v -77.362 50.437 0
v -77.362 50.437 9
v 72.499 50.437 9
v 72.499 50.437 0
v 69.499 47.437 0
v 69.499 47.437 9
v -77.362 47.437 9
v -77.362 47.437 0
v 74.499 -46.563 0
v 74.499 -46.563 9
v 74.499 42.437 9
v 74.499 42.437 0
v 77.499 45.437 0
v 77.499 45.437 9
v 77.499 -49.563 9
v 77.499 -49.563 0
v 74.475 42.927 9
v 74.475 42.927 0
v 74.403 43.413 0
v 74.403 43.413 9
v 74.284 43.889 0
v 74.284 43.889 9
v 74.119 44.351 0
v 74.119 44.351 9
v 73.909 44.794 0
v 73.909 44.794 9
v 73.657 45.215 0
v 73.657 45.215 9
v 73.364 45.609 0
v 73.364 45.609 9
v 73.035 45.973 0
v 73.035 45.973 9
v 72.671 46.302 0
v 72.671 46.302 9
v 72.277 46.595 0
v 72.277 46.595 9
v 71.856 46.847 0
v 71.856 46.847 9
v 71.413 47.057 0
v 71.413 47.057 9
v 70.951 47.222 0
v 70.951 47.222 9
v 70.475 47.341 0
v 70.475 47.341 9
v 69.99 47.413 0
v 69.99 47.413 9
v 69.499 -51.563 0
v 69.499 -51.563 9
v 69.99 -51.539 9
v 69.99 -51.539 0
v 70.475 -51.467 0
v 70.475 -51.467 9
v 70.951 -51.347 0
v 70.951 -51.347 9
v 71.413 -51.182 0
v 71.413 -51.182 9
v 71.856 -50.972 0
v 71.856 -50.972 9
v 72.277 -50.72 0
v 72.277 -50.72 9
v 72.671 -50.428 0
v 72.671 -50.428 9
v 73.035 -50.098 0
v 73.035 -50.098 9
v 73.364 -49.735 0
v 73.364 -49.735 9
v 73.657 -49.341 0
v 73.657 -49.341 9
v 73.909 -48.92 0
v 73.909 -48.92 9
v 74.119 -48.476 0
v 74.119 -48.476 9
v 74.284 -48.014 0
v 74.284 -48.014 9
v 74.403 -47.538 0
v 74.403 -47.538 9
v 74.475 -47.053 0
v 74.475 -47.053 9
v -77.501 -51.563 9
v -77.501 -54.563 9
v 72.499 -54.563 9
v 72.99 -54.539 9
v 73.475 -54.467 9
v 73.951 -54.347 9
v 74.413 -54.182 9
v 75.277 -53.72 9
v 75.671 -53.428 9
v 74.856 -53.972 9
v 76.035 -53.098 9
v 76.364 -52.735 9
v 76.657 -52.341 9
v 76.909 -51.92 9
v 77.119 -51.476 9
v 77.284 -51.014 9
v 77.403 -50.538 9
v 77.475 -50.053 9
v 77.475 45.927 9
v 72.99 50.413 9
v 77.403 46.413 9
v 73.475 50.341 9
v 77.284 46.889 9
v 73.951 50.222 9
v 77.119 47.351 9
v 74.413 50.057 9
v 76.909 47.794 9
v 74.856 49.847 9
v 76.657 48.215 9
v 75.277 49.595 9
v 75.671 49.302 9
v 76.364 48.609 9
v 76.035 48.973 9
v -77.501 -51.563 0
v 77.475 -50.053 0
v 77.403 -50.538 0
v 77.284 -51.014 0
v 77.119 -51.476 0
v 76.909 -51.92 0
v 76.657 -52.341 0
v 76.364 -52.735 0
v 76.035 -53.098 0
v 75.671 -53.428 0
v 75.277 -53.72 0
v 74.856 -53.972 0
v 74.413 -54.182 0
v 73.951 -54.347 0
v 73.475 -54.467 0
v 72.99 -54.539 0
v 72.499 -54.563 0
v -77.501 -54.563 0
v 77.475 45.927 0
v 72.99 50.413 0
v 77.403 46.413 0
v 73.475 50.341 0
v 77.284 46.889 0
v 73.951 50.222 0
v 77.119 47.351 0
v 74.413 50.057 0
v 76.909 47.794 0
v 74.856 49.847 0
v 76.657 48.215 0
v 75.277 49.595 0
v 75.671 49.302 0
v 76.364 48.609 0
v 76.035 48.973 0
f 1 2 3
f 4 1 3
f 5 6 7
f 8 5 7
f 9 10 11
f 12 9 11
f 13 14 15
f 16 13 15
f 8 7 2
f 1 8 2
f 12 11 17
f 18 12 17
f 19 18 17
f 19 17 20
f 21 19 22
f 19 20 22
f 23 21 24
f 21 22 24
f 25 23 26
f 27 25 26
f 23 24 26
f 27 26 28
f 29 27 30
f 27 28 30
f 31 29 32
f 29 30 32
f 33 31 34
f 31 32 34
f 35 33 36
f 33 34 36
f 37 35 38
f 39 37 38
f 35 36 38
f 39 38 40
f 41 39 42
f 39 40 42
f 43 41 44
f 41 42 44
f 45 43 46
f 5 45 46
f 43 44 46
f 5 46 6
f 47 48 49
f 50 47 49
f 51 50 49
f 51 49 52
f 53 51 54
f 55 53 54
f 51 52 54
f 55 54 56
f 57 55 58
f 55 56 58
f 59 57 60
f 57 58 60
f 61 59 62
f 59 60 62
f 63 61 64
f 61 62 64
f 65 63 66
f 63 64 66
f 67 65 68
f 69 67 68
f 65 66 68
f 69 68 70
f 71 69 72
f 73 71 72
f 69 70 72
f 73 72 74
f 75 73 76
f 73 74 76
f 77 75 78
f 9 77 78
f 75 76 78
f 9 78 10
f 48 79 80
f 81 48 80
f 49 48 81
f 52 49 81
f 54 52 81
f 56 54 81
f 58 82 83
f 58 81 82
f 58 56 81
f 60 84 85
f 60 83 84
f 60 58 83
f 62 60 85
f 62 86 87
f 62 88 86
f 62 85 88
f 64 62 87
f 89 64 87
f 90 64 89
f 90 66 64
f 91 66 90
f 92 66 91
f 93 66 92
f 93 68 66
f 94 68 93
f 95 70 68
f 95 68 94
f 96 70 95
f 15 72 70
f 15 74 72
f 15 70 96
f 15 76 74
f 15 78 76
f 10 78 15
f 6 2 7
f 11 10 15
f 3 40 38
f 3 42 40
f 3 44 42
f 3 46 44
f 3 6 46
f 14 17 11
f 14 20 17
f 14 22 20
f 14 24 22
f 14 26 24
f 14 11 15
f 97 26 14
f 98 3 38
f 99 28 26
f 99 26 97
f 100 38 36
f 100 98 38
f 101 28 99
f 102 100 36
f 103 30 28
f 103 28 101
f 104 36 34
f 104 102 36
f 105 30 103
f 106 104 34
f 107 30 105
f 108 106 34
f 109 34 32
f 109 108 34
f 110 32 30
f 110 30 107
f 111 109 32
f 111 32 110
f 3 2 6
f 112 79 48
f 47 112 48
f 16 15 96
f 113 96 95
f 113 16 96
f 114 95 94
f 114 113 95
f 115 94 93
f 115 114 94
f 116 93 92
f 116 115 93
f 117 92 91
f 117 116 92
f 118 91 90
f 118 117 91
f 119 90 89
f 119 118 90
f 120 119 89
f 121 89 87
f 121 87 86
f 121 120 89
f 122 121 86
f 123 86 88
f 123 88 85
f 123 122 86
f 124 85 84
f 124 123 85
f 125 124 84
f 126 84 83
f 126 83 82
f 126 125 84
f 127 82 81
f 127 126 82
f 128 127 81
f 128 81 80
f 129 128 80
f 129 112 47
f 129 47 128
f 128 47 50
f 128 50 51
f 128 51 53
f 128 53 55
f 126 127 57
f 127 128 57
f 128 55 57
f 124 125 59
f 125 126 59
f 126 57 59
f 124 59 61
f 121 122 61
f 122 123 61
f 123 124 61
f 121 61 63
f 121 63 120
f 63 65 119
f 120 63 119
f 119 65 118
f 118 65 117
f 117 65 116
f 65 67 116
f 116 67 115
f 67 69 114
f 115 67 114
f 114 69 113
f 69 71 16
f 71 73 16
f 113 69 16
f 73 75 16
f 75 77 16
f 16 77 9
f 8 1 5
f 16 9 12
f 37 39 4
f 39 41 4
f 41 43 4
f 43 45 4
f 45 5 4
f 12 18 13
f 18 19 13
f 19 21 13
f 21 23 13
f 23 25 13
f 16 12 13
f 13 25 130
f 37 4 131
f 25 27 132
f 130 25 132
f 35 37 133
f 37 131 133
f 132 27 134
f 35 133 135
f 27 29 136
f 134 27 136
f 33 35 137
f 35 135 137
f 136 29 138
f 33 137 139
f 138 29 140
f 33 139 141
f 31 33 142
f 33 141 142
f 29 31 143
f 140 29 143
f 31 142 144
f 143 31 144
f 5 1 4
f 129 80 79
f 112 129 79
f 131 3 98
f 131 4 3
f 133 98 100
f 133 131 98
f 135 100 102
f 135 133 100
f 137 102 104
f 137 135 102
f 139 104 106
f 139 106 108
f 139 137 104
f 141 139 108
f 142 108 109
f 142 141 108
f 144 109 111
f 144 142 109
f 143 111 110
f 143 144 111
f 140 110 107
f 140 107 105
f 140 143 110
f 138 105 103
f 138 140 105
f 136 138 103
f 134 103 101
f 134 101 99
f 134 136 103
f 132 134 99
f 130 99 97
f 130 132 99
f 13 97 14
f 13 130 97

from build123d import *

# Parameters (mm, degrees)
F0_W     = 200
F0_H     = 150
F1_DEPTH = 9
F2_W     = 10
F2_H     = 12.5
F3_DEPTH = 25
F4_R     = 5


with BuildPart() as f1:
    # F0 (on Top) → F1 (new body)
    with BuildSketch(Plane.XY):
        Rectangle(F0_W, F0_H)
    extrude(amount=F1_DEPTH)

    # F2 (on face) → F3 (cut)
    with BuildSketch(Plane.XY.offset(9)):
        Polygon((87.4994372893, -64.5627596692), (87.4994372893, 60.4372403308), (-87.5005627107, 60.4372403308), (-87.5005627107, 34.7239444211), (-41.0005627107, 34.7239444211), (-33.5005627107, 34.7239444211), (-33.5005627107, 26.7239444211), (-38.5005627107, 26.7239444211), (-38.5005627107, 29.7239444211), (-46.0005627107, 29.7239444211), (-87.5005627107, 29.7239444211), (-87.5005627107, 2.7372403308), (-92.5005627107, -0.2627596692), (-100, -0.2627596692), (-100, -3.8627596692), (-92.5005627107, -3.8627596692), (-87.5005627107, -6.8627596692), (-87.5005627107, -33.2760555789), (-38.5005627107, -33.2760555789), (-38.5005627107, -30.2760555789), (-33.5005627107, -30.2760555789), (-33.5005627107, -38.2760555789), (-41.0005627107, -38.2760555789), (-46.0005627107, -38.2760555789), (-87.5005627107, -38.2760555789), (-87.5005627107, -64.5627596692), (-77.5005627107, -64.5627596692), align=None)
        with BuildLine():
            Line((-77.3623862099, 50.4372403308), (-74.3623862099, 50.4372403308))
            Line((-74.3623862099, 50.4372403308), (60.6376137901, 50.4372403308))
            Line((60.6376137901, 50.4372403308), (74.4994372893, 50.4372403308))
            Line((74.4994372893, 50.4372403308), (77.4994372893, 50.4372403308))
            Line((77.4994372893, 50.4372403308), (77.4994372893, 47.4372403308))
            Line((77.4994372893, 47.4372403308), (77.4994372893, -54.5627596692))
            Line((77.4994372893, -54.5627596692), (60.6376137901, -54.5627596692))
            Line((60.6376137901, -54.5627596692), (-77.5005627107, -54.5627596692))
            Line((-77.5005627107, -54.5627596692), (-77.5005627107, -51.5627596692))
            Line((-77.5005627107, -51.5627596692), (60.6376137901, -51.5627596692))
            Line((60.6376137901, -51.5627596692), (69.4994372893, -51.5627596692))
            ThreePointArc((69.4994372893, -51.5627596692), (73.0349711952, -50.0982935751), (74.4994372893, -46.5627596692))
            Line((74.4994372893, -46.5627596692), (74.4994372893, 42.4372403308))
            ThreePointArc((74.4994372893, 42.4372403308), (73.0349711952, 45.9727742368), (69.4994372893, 47.4372403308))
            Line((69.4994372893, 47.4372403308), (60.6376137901, 47.4372403308))
            Line((60.6376137901, 47.4372403308), (57.6376137901, 47.4372403308))
            Line((57.6376137901, 47.4372403308), (-74.3623862099, 47.4372403308))
            Line((-74.3623862099, 47.4372403308), (-77.3623862099, 47.4372403308))
            Line((-77.3623862099, 47.4372403308), (-77.3623862099, 50.4372403308))
        make_face(mode=Mode.SUBTRACT)
        Polygon((39.9994372893, -27.0627596692), (39.9994372893, -2.0627596692), (39.9994372893, 22.9372403308), (39.9994372893, 35.4372403308), (49.9994372893, 35.4372403308), (49.9994372893, 22.9372403308), (49.9994372893, -27.0627596692), (49.9994372893, -39.5627596692), (39.9994372893, -39.5627596692), align=None, mode=Mode.SUBTRACT)
        Polygon((39.9994372893, 22.9372403308), (39.9994372893, -2.0627596692), (39.9994372893, -27.0627596692), (49.9994372893, -27.0627596692), (49.9994372893, 22.9372403308), align=None)
        with Locations((44.9994372893, 29.1872403308)):
            Rectangle(F2_W, F2_H)
        with Locations((44.9994372893, -33.3127596692)):
            Rectangle(F2_W, F2_H)
        Polygon((-87.5005627107, 60.4372403308), (87.4994372893, 60.4372403308), (87.4994372893, -64.5627596692), (-77.5005627107, -64.5627596692), (-87.5005627107, -64.5627596692), (-87.5005627107, -38.2760555789), (-46.0005627107, -38.2760555789), (-41.0005627107, -38.2760555789), (-33.5005627107, -38.2760555789), (-33.5005627107, -30.2760555789), (-38.5005627107, -30.2760555789), (-38.5005627107, -33.2760555789), (-87.5005627107, -33.2760555789), (-87.5005627107, -6.8627596692), (-92.5005627107, -3.8627596692), (-100, -3.8627596692), (-100, -75), (100, -75), (100, 75), (-100, 75), (-100, -0.2627596692), (-92.5005627107, -0.2627596692), (-87.5005627107, 2.7372403308), (-87.5005627107, 29.7239444211), (-46.0005627107, 29.7239444211), (-38.5005627107, 29.7239444211), (-38.5005627107, 26.7239444211), (-33.5005627107, 26.7239444211), (-33.5005627107, 34.7239444211), (-41.0005627107, 34.7239444211), (-87.5005627107, 34.7239444211), align=None)
    extrude(amount=-F3_DEPTH, mode=Mode.SUBTRACT)

    # F4
    f4_edges = [f1.edges().sort_by_distance(p)[0] for p in [
        (77.499437, 50.43724, 4.5),
        (77.499437, -54.56276, 4.5),
    ]]
    fillet(f4_edges, radius=F4_R)


solid = f1.part
